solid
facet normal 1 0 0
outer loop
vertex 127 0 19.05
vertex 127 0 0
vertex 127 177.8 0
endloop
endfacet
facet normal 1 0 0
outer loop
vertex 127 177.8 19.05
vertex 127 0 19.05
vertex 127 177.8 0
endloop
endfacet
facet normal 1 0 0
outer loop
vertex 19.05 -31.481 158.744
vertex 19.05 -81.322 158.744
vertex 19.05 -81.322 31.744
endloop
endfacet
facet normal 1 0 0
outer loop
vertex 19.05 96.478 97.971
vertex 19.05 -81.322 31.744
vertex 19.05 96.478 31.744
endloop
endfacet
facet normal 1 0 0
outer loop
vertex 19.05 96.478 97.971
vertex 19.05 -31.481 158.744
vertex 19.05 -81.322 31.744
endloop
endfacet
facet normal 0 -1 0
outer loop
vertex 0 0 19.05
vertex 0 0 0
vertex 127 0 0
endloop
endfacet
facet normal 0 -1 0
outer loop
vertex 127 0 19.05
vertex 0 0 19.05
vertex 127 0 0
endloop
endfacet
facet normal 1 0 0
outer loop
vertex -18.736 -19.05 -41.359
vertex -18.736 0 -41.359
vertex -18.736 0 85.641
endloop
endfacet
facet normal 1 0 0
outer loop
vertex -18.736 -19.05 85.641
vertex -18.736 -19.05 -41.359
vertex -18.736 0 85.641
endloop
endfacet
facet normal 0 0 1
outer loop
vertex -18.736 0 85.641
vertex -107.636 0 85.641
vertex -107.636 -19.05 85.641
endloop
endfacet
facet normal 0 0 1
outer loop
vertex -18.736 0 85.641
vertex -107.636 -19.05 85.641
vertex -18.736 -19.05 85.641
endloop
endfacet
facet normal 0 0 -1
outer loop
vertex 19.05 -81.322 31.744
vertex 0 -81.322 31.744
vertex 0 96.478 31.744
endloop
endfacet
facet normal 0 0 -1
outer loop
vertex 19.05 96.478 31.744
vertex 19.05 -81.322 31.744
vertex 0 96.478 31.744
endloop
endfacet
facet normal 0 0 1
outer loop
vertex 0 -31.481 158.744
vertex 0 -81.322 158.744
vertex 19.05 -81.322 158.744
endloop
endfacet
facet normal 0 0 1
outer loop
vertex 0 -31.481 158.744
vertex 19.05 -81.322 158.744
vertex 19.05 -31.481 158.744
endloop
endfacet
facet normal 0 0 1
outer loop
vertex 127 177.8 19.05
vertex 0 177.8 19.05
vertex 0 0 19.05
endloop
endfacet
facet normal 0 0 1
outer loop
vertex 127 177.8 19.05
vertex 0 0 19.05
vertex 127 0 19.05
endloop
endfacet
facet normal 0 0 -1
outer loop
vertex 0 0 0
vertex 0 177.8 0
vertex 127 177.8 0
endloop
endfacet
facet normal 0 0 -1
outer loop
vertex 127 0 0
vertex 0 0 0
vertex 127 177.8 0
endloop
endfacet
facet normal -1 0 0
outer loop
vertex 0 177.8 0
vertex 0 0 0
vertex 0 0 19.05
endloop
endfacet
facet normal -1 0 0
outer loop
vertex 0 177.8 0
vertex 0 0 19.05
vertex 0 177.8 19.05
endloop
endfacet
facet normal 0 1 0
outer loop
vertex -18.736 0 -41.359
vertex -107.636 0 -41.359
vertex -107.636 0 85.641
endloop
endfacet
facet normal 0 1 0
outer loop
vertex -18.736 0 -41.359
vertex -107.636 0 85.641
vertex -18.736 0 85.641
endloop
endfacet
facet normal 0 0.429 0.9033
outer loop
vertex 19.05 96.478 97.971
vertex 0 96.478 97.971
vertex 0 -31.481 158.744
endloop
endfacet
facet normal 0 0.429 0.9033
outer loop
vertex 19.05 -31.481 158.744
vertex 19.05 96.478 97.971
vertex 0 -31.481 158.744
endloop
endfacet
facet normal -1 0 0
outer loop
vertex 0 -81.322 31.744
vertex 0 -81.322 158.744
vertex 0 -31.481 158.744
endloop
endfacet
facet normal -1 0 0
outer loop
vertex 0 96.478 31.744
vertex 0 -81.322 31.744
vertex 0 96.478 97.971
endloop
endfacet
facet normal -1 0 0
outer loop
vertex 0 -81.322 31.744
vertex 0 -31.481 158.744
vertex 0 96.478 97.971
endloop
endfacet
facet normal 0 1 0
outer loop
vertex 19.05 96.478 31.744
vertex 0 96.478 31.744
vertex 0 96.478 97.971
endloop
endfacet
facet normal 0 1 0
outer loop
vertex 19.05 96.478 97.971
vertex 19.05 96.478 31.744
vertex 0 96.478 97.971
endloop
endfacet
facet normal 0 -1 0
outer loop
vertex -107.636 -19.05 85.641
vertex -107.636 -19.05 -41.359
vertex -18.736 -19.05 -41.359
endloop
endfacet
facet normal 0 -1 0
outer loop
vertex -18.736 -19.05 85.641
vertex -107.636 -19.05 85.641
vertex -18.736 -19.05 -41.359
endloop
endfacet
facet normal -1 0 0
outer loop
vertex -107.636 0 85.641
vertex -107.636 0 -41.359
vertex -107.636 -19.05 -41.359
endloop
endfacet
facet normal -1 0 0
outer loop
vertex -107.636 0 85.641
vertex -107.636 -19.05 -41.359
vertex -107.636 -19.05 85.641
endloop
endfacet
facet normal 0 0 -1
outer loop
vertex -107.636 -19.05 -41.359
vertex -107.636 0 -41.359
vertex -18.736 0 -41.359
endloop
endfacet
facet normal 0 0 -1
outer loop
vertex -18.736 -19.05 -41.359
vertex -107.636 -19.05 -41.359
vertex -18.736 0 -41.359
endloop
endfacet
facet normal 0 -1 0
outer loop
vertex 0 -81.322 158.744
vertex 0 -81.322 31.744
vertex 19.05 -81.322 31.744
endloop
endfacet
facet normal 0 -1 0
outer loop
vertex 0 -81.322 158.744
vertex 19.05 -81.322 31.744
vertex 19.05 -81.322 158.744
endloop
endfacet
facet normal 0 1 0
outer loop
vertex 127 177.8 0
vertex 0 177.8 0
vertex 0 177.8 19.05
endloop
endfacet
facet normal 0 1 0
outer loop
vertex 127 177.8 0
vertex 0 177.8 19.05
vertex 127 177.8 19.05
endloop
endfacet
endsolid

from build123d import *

# Parameters (mm, degrees)
F0_W     = 127
F0_H     = 177.8
F1_DEPTH = 19.05
F2_W     = 177.8
F2_H     = 127
F3_DEPTH = 19.05
F5_DEPTH = 127.001
F6_W     = 88.9
F6_H     = 127
F7_DEPTH = 19.05


with BuildPart() as f1:
    # F0 (on Top) → F1 (new body)
    with BuildSketch(Plane.XY):
        with Locations((63.5, 88.9)):
            Rectangle(F0_W, F0_H)
    extrude(amount=F1_DEPTH)


with BuildPart() as f3:
    # F2 (on Right) → F3 (new body)
    with BuildSketch(Plane.YZ):
        with Locations((7.578462, 95.243783)):
            Rectangle(F2_W, F2_H)
    extrude(amount=F3_DEPTH)

    # F4 (on face) → F5 (cut, through all)
    with BuildSketch(Plane(origin=(0, 0, 0), x_dir=(0, -1, 0), z_dir=(-1, 0, 0))):
        Polygon((-96.478462, 97.97103), (31.480607, 158.743783), (-96.478462, 158.743783), align=None)
    extrude(amount=-F5_DEPTH, mode=Mode.SUBTRACT)


with BuildPart() as f7:
    # F6 (on Front) → F7 (new body)
    with BuildSketch(Plane.XZ):
        with Locations((-63.18589, 22.140945)):
            Rectangle(F6_W, F6_H)
    extrude(amount=F7_DEPTH)


solid = Compound([f1.part, f3.part, f7.part])
